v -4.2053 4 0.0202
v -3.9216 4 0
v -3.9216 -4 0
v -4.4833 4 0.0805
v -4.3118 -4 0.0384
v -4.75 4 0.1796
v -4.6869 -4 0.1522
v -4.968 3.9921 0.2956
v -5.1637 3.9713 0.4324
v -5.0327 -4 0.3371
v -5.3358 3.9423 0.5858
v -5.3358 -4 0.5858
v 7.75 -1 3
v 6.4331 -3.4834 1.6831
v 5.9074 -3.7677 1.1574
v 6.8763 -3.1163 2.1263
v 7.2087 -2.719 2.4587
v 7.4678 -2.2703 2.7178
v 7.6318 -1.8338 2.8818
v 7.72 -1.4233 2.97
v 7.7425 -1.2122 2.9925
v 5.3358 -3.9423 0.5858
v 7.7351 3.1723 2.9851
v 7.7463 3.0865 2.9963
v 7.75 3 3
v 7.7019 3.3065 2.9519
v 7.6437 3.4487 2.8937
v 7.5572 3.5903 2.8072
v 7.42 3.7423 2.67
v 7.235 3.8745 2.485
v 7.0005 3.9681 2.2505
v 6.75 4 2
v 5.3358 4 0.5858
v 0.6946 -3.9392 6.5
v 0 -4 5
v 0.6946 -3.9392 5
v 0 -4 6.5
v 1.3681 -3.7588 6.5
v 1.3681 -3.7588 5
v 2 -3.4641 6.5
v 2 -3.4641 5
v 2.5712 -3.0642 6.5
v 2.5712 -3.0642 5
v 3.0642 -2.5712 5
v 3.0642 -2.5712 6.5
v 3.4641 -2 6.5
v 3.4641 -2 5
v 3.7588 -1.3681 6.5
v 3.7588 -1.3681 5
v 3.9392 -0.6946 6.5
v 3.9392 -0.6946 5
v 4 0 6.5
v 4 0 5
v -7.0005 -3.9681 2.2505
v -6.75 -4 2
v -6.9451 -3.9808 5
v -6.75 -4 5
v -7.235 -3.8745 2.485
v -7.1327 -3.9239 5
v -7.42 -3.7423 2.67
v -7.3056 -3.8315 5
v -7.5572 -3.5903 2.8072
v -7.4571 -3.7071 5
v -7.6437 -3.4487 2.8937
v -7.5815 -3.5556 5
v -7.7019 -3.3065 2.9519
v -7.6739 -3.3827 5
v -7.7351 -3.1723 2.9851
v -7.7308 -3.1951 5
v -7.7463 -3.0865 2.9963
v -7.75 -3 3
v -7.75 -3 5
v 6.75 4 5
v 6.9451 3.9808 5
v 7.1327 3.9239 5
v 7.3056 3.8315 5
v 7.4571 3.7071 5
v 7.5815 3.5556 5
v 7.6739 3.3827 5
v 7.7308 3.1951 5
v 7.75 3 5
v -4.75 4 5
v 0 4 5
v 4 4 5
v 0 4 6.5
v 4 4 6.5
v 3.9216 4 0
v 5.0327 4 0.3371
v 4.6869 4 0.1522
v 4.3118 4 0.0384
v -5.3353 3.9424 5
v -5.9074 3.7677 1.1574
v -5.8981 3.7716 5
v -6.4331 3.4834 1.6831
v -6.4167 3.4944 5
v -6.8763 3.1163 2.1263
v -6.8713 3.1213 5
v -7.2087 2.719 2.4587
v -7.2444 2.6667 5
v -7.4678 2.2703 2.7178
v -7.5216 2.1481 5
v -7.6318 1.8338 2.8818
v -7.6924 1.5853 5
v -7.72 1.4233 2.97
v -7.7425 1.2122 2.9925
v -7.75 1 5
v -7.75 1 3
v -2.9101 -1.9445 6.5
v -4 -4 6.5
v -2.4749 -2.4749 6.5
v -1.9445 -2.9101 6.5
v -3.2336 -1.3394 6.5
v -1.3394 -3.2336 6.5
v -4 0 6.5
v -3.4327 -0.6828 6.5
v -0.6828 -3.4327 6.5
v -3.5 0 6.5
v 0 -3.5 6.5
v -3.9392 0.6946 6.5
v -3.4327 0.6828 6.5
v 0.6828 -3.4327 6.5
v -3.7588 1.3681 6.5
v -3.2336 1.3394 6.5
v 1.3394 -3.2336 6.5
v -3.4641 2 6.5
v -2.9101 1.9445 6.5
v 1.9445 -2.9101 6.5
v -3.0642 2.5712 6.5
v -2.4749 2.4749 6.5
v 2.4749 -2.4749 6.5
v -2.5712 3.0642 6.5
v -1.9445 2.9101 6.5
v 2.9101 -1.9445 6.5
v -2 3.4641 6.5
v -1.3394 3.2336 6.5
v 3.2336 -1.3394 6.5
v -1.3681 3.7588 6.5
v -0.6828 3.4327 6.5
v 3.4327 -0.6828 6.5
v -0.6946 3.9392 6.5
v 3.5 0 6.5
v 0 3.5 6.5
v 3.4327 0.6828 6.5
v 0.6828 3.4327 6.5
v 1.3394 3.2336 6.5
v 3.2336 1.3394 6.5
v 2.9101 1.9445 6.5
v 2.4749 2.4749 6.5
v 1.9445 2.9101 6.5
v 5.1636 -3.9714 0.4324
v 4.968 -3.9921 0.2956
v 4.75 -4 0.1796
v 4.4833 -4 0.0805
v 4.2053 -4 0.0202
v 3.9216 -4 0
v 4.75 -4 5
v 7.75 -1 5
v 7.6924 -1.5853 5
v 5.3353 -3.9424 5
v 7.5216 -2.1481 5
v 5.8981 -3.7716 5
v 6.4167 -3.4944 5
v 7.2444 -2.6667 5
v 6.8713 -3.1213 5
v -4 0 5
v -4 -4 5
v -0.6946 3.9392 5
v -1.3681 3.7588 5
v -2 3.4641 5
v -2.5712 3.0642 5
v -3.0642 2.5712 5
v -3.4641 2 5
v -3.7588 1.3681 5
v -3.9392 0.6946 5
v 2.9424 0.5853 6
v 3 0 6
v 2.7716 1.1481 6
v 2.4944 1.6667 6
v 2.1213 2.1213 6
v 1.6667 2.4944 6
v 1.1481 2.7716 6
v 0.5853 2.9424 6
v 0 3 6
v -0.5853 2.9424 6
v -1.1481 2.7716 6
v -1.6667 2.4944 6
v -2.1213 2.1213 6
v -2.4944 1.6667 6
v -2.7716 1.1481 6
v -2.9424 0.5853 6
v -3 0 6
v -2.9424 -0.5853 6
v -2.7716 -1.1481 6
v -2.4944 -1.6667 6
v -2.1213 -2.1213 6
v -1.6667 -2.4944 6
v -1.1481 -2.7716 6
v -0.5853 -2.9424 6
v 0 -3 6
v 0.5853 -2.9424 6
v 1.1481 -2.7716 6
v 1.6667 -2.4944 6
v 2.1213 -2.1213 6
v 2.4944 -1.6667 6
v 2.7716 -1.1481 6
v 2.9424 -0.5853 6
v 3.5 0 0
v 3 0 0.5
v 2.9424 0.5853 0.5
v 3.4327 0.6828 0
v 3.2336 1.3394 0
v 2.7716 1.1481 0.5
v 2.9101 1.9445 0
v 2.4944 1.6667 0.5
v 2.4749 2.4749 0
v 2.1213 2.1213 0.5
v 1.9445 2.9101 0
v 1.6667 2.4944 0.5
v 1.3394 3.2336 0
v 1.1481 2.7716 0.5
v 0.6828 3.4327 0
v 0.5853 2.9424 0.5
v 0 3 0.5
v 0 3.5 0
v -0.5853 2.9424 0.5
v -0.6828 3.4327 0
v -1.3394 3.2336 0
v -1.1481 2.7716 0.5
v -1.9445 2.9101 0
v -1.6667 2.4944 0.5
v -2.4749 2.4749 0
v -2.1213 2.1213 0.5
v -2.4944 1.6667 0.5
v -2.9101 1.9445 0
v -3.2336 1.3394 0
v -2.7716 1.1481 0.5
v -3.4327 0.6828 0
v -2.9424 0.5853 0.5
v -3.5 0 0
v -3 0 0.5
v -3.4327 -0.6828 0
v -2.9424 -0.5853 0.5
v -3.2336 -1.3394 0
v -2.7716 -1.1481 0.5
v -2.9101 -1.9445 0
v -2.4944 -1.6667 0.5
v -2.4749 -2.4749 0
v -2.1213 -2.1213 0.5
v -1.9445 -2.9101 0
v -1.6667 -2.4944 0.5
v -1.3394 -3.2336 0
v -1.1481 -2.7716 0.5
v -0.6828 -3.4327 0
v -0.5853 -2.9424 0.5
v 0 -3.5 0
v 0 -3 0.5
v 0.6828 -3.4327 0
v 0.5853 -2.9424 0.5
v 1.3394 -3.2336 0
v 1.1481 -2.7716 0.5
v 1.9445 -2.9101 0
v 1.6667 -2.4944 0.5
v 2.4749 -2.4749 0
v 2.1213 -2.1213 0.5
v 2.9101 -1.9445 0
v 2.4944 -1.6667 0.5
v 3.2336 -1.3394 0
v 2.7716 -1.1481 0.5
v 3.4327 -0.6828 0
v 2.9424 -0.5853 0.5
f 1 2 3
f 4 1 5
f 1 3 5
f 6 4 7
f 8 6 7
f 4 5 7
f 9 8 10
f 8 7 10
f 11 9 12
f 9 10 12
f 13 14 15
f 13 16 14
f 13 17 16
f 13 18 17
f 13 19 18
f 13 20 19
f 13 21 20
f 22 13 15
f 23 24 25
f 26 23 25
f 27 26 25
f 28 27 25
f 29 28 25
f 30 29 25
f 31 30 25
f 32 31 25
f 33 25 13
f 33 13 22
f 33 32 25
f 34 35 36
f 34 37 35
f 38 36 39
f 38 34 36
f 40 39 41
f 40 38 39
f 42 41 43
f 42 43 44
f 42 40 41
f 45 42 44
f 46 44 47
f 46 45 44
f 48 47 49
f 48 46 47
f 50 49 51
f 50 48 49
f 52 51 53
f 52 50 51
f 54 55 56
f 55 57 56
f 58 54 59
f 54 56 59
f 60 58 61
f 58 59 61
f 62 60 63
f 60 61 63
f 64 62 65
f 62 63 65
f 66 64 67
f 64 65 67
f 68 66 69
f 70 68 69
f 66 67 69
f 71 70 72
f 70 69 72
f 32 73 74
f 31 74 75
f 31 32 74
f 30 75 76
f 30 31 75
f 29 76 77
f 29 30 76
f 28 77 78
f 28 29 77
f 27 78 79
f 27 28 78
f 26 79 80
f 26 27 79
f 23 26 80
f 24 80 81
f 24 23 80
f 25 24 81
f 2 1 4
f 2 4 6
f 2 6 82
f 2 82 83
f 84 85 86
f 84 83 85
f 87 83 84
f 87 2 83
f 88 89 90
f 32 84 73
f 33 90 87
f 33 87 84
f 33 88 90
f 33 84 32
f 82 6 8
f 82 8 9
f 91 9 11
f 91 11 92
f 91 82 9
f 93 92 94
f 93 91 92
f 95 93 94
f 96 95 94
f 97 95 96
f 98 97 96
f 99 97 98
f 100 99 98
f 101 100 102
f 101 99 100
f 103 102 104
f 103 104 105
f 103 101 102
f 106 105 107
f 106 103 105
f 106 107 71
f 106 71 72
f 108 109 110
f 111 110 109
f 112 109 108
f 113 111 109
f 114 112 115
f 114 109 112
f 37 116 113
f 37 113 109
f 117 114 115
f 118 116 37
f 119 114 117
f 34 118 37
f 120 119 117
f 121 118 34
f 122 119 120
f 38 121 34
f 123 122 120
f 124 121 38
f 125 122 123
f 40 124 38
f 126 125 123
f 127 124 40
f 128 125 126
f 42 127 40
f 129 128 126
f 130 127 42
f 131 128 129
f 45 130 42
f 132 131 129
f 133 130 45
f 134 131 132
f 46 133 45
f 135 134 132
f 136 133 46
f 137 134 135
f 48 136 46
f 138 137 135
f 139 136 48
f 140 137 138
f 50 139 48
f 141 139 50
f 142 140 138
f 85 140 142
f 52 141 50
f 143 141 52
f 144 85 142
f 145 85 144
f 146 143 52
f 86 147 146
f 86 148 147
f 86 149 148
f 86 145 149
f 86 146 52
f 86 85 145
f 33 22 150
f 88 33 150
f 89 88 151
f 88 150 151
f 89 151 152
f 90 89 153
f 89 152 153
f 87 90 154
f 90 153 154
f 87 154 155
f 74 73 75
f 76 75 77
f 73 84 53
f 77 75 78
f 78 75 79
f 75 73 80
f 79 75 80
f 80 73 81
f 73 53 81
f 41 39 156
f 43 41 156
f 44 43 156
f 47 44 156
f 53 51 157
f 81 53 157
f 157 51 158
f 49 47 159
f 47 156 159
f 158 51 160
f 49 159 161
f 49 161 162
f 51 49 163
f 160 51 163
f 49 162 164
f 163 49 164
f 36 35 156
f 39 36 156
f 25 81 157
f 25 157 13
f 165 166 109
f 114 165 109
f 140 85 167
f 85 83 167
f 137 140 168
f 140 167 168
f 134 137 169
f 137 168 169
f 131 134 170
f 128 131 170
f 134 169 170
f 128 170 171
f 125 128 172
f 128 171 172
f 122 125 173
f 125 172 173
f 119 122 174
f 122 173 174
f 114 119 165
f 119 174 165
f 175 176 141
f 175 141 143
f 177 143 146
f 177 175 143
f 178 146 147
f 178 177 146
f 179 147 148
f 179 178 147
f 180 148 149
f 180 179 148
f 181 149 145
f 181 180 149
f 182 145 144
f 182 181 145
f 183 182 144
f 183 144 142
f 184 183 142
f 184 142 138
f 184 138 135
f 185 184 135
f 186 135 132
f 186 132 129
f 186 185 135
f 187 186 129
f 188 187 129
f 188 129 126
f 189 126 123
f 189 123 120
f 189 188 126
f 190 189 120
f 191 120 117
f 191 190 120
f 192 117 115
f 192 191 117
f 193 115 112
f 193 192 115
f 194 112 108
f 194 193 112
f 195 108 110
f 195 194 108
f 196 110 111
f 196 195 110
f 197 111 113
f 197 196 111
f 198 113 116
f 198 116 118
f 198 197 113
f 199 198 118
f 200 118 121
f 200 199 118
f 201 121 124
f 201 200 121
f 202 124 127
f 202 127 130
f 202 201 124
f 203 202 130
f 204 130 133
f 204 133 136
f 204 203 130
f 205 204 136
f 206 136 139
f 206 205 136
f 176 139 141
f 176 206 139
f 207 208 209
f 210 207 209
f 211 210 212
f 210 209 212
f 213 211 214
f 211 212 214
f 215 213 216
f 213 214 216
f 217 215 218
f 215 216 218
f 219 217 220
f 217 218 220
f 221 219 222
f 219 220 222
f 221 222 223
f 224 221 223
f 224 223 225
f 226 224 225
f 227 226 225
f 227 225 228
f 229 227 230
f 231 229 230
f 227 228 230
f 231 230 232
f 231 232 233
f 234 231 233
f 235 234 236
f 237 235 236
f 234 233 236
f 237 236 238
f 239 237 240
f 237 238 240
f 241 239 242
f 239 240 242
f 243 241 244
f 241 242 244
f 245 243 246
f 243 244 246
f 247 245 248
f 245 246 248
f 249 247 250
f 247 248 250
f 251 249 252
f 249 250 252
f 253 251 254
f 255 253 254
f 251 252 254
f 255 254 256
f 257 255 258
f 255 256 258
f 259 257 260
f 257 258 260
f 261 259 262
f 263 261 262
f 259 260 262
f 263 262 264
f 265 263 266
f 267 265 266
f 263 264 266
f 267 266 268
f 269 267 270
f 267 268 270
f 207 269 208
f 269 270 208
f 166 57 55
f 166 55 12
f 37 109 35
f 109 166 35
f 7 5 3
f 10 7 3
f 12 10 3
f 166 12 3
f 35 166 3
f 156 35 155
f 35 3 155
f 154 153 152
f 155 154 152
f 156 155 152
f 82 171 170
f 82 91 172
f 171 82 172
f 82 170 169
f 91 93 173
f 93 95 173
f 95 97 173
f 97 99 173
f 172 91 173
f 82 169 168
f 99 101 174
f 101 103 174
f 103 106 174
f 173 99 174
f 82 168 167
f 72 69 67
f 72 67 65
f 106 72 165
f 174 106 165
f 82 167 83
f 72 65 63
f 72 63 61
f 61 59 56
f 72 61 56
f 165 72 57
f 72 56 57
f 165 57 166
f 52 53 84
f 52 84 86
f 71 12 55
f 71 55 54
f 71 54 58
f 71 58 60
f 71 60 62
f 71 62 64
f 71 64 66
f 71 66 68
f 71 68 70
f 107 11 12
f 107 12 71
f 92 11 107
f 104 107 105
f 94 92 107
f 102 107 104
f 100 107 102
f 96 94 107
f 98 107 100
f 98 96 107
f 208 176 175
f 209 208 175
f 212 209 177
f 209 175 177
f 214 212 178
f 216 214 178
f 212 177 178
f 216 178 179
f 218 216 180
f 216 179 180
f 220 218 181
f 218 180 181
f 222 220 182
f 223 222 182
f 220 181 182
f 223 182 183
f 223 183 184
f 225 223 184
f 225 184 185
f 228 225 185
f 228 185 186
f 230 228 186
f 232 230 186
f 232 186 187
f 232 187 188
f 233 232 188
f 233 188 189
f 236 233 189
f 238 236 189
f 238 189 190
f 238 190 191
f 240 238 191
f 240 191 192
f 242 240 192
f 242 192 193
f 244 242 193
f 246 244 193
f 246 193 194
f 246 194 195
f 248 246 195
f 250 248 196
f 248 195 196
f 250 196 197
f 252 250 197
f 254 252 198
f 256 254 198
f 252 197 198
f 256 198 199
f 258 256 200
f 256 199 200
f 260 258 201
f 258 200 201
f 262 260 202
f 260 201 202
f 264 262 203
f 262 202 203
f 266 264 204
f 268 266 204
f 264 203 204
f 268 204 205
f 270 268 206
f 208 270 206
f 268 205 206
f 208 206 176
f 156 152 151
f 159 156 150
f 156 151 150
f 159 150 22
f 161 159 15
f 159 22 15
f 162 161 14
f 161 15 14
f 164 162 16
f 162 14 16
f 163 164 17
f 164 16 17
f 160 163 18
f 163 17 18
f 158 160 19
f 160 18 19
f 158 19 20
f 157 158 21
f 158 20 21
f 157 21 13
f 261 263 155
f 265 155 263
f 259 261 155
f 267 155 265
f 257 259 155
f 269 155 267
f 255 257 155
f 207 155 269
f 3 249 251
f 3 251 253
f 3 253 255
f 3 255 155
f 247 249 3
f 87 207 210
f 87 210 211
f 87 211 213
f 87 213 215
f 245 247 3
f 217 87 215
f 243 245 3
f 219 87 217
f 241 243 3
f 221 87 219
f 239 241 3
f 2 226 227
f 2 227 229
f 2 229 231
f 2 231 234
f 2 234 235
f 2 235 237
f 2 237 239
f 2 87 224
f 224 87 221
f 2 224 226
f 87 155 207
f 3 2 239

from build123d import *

# Parameters (mm, degrees)
EXTRUDE_1_DEPTH       = 8
SKETCH_2_W            = 3.75
SKETCH_2_H            = 1.5
CUT_EXTRUDE_1_DEPTH   = 13.896220377
SKETCH_3_W            = 3.75
SKETCH_3_H            = 1.5
CUT_EXTRUDE_2_DEPTH   = 13.896220377
HOLE_WIZARD_6_0_6_1_D = 6
CHAMFER_1_SIZE        = 0.5
FILLET_1_R            = 1
FILLET_2_R            = 2
FILLET_3_R            = 3
FILLET_4_R            = 4


with BuildPart() as part:
    # 草图1 → 凸台-拉伸1 (new body)
    with BuildSketch(Plane(origin=(0, 4, 0), x_dir=(1, 0, 0), z_dir=(0, 1, 0))):
        Polygon((-7.75, -3), (-7.75, -6.5), (7.75, -6.5), (7.75, -3), (4.75, 0), (-4.75, 0), align=None)
    extrude(amount=-EXTRUDE_1_DEPTH)

    # 草图2 → 切除-拉伸1 (cut, through all)
    with BuildSketch(Plane.XZ.offset(4)):
        with Locations((-5.875, 5.75)):
            Rectangle(SKETCH_2_W, SKETCH_2_H)
    extrude(amount=-CUT_EXTRUDE_1_DEPTH, mode=Mode.SUBTRACT)

    # 草图3 → 切除-拉伸2 (cut, through all)
    with BuildSketch(Plane.XZ.offset(4)):
        with Locations((5.875, 5.75)):
            Rectangle(SKETCH_3_W, SKETCH_3_H)
    extrude(amount=-CUT_EXTRUDE_2_DEPTH, mode=Mode.SUBTRACT)

    # Ø6.0 (6) 直径孔1 (through all)
    with Locations(Plane(origin=(0, 0, 0), x_dir=(-1, 0, 0), z_dir=(0, 0, -1))):
        with Locations((0, 0)):
            Hole(HOLE_WIZARD_6_0_6_1_D / 2)

    # 倒角1
    chamfer_1_edges = [part.edges().sort_by_distance(p)[0] for p in [
        (-3, 0, 0),
        (-3, 0, 6.5),
    ]]
    chamfer(chamfer_1_edges, length=CHAMFER_1_SIZE)

    # 圆角1
    fillet_1_edges = [part.edges().sort_by_distance(p)[0] for p in [
        (7.75, 4, 4),
        (-7.75, -4, 4),
    ]]
    fillet(fillet_1_edges, radius=FILLET_1_R)

    # 圆角2
    fillet_2_edges = [part.edges().sort_by_distance(p)[0] for p in [
        (-4.75, 0, 0),
        (4.75, 0, 0),
    ]]
    fillet(fillet_2_edges, radius=FILLET_2_R)

    # 圆角3
    fillet_3_edges = [part.edges().sort_by_distance(p)[0] for p in [
        (7.75, -4, 4),
        (-7.75, 4, 4),
    ]]
    fillet(fillet_3_edges, radius=FILLET_3_R)

    # 圆角4
    fillet_4_edges = [part.edges().sort_by_distance(p)[0] for p in [
        (-4, 4, 5.75),
        (4, -4, 5.75),
    ]]
    fillet(fillet_4_edges, radius=FILLET_4_R)


solid = part.part
